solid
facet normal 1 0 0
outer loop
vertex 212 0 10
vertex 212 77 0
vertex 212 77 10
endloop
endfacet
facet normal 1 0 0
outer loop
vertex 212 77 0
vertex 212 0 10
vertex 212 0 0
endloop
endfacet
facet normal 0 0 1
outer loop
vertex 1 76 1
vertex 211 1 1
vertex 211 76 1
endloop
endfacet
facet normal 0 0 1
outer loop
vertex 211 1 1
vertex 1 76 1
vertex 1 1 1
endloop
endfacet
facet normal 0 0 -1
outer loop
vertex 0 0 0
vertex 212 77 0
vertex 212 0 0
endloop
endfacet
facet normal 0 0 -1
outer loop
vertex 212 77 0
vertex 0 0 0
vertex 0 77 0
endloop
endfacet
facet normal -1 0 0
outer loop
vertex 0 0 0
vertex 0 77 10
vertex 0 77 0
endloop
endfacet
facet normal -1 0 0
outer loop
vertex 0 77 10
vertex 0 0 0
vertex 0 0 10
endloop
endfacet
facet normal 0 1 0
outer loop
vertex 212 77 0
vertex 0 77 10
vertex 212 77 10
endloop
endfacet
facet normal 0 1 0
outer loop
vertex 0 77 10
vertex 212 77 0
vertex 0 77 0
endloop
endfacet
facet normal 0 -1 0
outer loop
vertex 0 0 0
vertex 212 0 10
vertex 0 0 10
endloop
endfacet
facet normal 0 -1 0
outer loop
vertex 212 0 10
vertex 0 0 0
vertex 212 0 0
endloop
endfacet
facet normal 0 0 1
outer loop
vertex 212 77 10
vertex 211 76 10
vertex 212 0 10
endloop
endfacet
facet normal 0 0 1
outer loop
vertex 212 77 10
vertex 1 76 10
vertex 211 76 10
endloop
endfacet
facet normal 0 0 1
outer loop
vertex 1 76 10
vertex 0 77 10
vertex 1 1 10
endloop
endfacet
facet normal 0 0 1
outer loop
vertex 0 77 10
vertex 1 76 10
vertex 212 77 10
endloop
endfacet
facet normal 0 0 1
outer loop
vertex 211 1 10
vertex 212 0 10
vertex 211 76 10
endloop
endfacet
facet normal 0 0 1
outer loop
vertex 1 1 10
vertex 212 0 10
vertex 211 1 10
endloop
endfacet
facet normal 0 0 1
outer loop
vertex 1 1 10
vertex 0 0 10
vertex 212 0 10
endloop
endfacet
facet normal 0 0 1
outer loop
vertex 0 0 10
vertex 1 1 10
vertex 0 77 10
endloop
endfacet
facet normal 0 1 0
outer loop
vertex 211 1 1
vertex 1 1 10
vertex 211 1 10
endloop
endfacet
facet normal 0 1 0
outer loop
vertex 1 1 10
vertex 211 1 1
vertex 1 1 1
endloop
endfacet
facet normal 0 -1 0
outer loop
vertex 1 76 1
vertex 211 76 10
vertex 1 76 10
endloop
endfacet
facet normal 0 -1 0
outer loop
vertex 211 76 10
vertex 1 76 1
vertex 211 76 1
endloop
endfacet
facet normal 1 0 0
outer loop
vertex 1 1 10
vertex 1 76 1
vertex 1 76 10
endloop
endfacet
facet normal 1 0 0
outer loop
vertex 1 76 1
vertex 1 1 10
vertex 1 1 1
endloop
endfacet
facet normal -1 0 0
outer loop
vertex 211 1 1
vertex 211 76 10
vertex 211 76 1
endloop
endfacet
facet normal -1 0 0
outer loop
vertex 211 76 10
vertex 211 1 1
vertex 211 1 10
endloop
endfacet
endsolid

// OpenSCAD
// Dimensions
trayLength = 210;
trayWidth = 75;
trayHeight = 1;

wallHeight = 10;
wallDepth = 1;

// Model
// Tray Base
cube([trayLength + (2 * wallDepth), trayWidth + (2 * wallDepth), trayHeight]);
// Tray Walls (Long Sides)
cube([trayLength + (2 * wallDepth), wallDepth, wallHeight]);
translate([0,trayWidth + wallDepth, 0]) {
    cube([trayLength + (2 * wallDepth), wallDepth, wallHeight]);
}
// Tray Walls (Short Sides)
cube([wallDepth, trayWidth + (2 * wallDepth), wallHeight]);
translate([trayLength + wallDepth, 0, 0]) {
    cube([wallDepth, trayWidth + (2 * wallDepth), wallHeight]);
}
